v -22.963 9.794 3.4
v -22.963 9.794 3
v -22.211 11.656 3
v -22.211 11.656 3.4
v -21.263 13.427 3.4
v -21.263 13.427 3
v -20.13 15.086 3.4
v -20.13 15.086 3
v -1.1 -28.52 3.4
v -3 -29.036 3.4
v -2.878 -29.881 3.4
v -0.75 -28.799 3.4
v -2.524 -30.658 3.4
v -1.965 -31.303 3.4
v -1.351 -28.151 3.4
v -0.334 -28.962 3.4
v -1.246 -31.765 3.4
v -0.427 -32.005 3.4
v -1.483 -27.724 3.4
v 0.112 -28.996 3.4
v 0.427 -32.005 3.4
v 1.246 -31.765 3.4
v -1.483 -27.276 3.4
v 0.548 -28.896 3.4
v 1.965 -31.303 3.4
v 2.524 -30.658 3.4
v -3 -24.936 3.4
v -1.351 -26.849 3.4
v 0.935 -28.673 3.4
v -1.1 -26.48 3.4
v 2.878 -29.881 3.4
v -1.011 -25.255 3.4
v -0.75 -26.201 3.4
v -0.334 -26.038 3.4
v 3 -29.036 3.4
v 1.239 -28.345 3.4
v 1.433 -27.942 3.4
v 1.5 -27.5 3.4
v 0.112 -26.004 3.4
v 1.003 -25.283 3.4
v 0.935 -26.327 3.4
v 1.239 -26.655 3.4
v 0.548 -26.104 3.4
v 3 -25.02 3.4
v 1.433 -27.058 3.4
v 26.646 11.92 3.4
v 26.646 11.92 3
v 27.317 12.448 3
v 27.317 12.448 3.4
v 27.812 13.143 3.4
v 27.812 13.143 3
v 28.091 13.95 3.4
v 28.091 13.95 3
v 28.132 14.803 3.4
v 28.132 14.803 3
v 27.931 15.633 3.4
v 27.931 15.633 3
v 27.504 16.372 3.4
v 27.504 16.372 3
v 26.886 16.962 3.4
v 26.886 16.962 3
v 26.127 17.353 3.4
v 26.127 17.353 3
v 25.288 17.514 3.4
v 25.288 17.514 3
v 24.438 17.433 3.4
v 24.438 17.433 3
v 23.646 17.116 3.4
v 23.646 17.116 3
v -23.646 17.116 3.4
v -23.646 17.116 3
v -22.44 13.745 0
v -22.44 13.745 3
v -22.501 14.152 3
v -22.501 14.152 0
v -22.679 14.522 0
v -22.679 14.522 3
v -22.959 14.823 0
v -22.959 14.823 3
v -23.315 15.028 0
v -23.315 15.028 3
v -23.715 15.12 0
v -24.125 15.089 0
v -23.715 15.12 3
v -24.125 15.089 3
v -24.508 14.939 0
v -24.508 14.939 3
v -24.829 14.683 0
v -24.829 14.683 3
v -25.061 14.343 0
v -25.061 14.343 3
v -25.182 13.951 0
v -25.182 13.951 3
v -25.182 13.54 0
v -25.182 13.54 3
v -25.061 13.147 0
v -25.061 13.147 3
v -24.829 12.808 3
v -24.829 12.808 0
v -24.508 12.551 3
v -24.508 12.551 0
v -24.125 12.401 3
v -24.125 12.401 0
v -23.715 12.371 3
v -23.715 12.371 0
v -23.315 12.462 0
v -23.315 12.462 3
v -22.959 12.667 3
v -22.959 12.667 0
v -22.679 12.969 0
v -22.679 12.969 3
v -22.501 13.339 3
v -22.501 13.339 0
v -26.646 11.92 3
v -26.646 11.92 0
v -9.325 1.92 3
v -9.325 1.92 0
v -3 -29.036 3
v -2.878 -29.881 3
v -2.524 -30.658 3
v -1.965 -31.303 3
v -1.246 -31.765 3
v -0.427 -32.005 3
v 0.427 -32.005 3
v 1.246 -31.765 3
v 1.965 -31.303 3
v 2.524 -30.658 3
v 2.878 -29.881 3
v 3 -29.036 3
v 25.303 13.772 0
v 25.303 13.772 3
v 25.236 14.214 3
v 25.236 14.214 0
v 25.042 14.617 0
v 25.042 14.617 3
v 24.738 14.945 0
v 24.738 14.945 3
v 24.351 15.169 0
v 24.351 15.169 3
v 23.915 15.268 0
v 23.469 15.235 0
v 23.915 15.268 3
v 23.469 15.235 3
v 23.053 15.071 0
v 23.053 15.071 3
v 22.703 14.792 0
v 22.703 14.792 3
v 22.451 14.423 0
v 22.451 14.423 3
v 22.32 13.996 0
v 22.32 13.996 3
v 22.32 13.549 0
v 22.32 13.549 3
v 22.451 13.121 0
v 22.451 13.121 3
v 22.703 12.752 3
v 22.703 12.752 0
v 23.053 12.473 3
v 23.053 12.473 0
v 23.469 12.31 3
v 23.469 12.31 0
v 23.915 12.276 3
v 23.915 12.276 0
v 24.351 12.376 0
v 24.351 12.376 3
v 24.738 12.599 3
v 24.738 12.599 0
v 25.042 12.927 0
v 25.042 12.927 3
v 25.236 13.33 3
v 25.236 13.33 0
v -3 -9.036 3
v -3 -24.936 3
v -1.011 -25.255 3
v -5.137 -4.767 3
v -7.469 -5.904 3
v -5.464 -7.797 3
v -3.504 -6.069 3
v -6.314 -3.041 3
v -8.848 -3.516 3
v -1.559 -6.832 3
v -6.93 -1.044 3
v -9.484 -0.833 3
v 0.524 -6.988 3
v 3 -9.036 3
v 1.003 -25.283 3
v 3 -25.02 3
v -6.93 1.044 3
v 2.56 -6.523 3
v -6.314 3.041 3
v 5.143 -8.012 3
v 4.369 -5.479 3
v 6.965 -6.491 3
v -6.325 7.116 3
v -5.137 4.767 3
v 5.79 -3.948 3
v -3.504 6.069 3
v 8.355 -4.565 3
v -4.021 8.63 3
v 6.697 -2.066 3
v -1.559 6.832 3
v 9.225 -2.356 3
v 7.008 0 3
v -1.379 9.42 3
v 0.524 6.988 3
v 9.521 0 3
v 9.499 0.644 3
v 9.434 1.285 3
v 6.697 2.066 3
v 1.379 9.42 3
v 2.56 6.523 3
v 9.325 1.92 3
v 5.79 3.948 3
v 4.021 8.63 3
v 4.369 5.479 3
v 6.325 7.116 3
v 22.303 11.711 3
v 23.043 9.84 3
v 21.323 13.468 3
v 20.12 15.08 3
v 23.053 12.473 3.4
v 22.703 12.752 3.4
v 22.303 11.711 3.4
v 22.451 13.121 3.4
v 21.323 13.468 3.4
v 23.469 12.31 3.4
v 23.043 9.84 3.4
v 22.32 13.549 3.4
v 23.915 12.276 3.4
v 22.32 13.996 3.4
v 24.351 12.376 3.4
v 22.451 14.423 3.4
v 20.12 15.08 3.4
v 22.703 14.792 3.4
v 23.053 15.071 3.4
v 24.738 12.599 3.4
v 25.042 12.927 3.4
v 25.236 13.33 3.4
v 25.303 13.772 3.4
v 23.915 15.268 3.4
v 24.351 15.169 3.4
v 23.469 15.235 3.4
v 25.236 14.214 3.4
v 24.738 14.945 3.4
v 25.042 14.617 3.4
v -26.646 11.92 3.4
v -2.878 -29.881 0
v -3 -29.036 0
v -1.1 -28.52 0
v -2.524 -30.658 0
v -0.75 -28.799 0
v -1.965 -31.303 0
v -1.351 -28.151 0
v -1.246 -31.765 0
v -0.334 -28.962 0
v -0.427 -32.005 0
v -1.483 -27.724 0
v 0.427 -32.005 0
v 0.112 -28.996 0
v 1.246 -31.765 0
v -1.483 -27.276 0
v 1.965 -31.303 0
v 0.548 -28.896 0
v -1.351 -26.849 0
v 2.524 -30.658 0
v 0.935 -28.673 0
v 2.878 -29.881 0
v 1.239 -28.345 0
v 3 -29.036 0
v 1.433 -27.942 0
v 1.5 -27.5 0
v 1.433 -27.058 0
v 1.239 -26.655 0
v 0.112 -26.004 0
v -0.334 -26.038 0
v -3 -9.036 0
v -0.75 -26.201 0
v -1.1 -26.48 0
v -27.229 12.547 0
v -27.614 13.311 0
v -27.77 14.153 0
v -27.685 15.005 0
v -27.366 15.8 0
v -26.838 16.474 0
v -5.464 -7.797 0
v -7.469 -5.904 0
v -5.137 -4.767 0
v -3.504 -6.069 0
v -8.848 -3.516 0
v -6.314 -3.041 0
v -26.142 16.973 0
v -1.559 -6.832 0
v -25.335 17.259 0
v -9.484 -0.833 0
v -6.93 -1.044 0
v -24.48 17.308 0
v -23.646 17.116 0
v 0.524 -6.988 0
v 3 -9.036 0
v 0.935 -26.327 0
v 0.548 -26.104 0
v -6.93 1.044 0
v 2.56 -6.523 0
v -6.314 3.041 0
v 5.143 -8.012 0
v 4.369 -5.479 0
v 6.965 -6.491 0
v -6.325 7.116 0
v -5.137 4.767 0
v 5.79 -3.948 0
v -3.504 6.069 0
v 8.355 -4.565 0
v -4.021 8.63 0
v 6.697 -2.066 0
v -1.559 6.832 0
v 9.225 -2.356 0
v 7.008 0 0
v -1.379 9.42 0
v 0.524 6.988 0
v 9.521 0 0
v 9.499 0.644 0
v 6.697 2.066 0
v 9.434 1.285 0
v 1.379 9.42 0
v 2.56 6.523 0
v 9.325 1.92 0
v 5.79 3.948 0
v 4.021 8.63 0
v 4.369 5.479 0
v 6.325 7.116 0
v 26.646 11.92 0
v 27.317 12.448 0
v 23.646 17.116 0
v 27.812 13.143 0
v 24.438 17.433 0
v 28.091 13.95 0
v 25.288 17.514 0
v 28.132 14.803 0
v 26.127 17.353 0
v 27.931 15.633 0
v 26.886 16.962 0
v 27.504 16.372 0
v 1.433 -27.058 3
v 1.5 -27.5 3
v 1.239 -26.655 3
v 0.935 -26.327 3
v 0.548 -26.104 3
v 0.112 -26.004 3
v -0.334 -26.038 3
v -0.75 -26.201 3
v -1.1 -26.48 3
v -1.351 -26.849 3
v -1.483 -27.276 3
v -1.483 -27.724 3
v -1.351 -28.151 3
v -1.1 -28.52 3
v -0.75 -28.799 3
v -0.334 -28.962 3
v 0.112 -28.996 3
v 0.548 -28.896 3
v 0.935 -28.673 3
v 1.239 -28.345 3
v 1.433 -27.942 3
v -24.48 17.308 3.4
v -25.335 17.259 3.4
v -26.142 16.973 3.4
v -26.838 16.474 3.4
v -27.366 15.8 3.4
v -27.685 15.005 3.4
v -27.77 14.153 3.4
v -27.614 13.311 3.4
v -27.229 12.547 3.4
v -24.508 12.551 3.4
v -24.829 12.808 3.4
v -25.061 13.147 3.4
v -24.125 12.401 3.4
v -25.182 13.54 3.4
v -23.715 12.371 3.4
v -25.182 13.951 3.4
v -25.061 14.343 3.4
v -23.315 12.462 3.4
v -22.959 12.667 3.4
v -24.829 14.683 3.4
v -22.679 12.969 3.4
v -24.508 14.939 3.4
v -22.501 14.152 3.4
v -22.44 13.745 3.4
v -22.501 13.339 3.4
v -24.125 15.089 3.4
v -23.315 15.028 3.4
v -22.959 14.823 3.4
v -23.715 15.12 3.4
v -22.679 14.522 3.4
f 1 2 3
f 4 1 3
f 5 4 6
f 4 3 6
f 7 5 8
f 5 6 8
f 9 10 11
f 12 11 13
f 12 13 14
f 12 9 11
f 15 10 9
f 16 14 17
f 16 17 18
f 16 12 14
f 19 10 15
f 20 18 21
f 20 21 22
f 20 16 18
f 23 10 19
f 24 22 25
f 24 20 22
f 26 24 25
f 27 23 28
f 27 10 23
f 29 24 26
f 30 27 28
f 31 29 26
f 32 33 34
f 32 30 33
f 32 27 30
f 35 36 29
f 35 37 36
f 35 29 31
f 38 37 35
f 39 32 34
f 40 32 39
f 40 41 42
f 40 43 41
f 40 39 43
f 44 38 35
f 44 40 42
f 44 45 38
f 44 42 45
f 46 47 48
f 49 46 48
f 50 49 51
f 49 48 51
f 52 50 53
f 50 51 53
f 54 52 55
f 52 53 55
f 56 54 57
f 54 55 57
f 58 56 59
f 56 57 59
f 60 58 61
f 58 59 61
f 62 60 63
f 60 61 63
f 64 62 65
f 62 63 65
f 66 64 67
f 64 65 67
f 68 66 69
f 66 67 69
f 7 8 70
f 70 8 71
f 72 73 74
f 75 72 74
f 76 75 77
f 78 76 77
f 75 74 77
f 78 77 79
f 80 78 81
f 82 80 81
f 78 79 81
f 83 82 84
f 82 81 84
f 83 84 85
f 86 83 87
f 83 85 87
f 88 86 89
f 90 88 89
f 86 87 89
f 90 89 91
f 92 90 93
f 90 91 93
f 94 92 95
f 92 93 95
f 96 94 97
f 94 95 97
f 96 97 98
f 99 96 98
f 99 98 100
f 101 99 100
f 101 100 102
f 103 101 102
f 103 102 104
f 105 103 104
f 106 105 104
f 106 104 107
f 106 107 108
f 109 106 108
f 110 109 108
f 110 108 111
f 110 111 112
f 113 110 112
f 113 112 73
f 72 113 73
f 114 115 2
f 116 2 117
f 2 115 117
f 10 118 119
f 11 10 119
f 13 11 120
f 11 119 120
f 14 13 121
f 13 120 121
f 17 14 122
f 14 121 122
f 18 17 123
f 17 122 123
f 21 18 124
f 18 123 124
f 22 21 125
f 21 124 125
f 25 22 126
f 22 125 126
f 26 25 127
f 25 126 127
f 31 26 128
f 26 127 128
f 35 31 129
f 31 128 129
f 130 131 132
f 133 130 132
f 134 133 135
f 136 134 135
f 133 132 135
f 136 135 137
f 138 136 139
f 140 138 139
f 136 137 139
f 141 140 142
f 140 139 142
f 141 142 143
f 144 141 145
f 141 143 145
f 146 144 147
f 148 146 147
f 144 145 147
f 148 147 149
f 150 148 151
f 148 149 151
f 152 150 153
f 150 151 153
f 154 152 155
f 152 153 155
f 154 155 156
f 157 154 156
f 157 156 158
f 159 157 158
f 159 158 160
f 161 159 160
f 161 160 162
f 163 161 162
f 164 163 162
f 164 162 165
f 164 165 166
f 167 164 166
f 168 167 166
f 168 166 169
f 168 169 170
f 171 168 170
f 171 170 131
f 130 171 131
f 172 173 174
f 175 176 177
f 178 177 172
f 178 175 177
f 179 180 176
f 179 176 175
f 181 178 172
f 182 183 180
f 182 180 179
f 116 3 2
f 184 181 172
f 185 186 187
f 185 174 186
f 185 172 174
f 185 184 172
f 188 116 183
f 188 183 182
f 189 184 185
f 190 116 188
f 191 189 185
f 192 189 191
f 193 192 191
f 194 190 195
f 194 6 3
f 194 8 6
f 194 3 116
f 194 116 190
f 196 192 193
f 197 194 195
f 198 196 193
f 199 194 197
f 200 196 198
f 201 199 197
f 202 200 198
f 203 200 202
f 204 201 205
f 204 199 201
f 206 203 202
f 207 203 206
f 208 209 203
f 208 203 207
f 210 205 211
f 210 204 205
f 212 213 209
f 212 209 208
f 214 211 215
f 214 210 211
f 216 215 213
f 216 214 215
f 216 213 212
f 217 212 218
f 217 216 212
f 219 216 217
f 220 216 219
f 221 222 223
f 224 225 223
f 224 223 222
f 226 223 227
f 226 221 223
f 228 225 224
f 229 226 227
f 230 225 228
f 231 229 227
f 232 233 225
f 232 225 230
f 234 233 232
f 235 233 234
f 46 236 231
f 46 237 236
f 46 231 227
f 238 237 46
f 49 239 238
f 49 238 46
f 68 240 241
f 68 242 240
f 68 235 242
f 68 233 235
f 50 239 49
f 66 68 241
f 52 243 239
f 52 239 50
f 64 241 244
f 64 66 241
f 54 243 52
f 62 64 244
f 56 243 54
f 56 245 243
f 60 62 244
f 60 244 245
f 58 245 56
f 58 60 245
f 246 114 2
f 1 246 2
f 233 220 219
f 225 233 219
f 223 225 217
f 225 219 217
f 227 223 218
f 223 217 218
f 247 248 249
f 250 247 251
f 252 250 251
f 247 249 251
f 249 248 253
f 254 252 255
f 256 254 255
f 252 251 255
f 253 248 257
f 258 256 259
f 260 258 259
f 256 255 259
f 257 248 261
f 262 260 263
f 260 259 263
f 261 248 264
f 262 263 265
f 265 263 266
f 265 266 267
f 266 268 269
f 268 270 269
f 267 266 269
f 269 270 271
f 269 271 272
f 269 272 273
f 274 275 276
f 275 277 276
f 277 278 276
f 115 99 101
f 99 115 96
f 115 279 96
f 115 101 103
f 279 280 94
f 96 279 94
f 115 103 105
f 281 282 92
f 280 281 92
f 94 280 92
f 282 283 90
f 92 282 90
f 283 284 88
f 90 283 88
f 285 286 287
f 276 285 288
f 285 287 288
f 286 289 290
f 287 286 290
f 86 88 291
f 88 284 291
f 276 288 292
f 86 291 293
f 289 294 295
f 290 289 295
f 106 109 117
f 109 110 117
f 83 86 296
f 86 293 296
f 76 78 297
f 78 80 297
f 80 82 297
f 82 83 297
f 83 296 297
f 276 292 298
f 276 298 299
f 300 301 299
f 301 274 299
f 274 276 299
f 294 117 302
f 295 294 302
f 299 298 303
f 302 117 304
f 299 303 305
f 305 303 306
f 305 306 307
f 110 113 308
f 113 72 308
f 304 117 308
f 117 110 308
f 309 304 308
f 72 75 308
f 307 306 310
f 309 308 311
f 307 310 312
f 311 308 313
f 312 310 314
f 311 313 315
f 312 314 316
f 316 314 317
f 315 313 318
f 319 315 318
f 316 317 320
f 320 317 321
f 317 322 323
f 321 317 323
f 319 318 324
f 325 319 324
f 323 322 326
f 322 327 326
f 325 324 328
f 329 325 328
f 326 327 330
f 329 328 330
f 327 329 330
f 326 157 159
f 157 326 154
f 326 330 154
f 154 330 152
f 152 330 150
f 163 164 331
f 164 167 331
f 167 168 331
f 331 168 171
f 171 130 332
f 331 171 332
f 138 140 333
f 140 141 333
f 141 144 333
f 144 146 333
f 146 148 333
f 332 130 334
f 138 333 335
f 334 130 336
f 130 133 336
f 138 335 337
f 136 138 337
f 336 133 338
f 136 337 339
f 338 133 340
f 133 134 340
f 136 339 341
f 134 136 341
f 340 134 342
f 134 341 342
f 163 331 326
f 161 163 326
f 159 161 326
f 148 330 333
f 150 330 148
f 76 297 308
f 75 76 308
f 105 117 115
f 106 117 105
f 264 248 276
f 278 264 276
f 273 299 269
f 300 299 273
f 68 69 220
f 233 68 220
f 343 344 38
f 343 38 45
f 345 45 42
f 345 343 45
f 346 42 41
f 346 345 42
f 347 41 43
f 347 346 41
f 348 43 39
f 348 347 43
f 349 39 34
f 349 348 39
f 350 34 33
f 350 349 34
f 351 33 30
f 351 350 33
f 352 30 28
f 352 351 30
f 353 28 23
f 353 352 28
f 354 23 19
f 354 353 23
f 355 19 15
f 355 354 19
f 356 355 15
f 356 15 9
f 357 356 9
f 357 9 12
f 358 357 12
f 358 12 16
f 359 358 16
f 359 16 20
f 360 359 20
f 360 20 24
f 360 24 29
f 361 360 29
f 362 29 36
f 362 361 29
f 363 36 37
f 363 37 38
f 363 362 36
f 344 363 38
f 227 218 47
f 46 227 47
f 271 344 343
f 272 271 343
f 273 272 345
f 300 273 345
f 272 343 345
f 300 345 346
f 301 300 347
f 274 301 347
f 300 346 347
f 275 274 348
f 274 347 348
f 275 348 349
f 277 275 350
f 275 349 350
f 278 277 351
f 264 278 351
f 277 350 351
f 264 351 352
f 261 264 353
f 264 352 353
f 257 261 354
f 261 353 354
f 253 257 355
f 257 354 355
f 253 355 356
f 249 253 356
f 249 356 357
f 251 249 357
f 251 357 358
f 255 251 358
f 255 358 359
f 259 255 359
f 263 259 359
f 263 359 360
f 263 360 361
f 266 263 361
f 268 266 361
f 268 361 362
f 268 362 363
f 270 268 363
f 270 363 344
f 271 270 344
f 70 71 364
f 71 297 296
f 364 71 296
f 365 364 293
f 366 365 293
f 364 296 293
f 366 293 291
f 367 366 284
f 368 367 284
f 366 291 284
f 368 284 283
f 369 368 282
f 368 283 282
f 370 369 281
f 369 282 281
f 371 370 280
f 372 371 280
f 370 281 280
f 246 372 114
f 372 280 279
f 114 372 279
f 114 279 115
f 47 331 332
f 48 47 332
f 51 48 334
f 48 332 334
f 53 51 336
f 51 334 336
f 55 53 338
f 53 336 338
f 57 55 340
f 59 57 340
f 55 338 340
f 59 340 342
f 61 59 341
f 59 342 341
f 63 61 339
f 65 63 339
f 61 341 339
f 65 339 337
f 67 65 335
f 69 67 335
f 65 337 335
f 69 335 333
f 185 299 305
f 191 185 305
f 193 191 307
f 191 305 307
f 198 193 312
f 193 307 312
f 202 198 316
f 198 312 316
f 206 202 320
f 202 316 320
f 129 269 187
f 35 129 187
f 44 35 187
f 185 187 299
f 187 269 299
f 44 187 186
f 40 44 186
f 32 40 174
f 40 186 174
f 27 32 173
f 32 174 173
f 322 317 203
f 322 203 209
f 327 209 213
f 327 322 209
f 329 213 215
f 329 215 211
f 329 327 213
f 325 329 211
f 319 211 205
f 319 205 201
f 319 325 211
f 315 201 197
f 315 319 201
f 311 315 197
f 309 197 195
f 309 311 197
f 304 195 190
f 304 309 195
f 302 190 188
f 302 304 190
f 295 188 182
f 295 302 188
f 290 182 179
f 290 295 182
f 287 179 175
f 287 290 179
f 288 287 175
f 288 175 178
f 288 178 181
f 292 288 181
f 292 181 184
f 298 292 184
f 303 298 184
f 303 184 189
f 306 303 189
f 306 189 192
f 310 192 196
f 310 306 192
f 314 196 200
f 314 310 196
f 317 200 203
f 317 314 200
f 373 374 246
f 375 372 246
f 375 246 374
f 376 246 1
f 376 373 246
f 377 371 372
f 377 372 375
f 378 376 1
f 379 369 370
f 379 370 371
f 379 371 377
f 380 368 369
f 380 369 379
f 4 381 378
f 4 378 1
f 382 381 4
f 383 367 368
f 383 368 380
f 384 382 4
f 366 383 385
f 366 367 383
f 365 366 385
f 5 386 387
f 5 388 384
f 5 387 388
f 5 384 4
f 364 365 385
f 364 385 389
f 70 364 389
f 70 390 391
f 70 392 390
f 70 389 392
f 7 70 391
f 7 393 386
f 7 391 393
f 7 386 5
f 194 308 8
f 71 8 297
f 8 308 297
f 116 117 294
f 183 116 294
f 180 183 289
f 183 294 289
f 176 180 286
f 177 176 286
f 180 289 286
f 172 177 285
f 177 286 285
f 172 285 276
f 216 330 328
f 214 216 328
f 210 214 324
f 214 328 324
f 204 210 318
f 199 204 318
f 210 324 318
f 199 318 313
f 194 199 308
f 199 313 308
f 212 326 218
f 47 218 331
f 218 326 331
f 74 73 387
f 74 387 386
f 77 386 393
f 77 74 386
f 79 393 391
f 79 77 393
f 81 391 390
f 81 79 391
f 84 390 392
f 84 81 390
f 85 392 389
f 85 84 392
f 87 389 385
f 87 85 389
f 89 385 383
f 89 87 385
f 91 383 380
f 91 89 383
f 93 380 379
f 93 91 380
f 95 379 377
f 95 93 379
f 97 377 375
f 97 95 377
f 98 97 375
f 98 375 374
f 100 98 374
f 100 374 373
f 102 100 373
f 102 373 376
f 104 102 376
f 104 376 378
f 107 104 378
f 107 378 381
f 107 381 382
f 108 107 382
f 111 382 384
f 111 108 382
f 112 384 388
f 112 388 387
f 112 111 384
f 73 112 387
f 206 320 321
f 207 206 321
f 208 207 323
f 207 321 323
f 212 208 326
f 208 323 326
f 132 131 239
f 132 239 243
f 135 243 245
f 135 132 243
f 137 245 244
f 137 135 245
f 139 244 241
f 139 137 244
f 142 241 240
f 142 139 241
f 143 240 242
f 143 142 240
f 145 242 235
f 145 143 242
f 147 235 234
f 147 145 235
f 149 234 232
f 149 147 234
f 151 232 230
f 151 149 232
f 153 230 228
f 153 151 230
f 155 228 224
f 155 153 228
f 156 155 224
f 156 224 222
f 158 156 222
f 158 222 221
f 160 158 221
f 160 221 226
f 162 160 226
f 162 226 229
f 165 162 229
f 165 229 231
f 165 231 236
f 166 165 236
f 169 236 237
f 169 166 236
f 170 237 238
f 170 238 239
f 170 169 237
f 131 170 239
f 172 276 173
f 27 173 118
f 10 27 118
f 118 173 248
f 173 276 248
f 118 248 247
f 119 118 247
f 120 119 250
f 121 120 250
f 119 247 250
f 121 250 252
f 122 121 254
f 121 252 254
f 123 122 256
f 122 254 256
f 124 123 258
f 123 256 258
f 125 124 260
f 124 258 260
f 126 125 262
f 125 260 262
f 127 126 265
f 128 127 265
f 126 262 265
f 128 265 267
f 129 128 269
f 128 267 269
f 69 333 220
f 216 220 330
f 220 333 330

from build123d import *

# Parameters (mm, degrees)
F1_R     = 7.0078592828
F2_DEPTH = 3
F3_R     = 1.3785641614
F3_R_2   = 1.5
F4_DEPTH = 25
F5_R     = 1.3785641614
F5_R_2   = 1.5
F6_DEPTH = 0.4


# Not quite as in the source:
# - a feature names something its author has since deleted; it is built from what else it names


with BuildPart() as f2:
    # F1 (on Top) → F2 (new body)
    with BuildSketch(Plane.XY):
        with BuildLine():
            ThreePointArc((6.3250837122, 7.115890399), (8.2451158332, 4.7603198458), (9.3250837122, 1.9197379763))
            Line((9.3250837122, 1.9197379763), (26.6455917878, 11.9197379763))
            ThreePointArc((26.6455917878, 11.9197379763), (27.7436679992, 16.0178141876), (23.6455917878, 17.115890399))
            Line((23.6455917878, 17.115890399), (6.3250837122, 7.115890399))
        make_face()
        with BuildLine():
            Line((3, -29.0356283753), (3, -9.0356283753))
            ThreePointArc((3, -9.0356283753), (0, -9.5206396916), (-3, -9.0356283753))
            Line((-3, -9.0356283753), (-3, -29.0356283753))
            ThreePointArc((-3, -29.0356283753), (0, -32.0356283753), (3, -29.0356283753))
        make_face()
        with BuildLine():
            ThreePointArc((3, -9.0356283753), (7.7202493228, -5.5713849742), (9.5206396916, 0))
            ThreePointArc((9.5206396916, 0), (9.4716245242, 0.9648362606), (9.3250837122, 1.9197379763))
            ThreePointArc((9.3250837122, 1.9197379763), (8.2451158332, 4.7603198458), (6.3250837122, 7.115890399))
            ThreePointArc((6.3250837122, 7.115890399), (0, 9.5206396916), (-6.3250837122, 7.115890399))
            ThreePointArc((-6.3250837122, 7.115890399), (-8.2451158332, 4.7603198458), (-9.3250837122, 1.9197379763))
            ThreePointArc((-9.3250837122, 1.9197379763), (-8.2451158332, -4.7603198458), (-3, -9.0356283753))
            ThreePointArc((-3, -9.0356283753), (0, -9.5206396916), (3, -9.0356283753))
        make_face()
        Circle(F1_R, mode=Mode.SUBTRACT)
        with BuildLine():
            ThreePointArc((-9.3250837122, 1.9197379763), (-8.2451158332, 4.7603198458), (-6.3250837122, 7.115890399))
            Line((-6.3250837122, 7.115890399), (-23.6455917878, 17.115890399))
            ThreePointArc((-23.6455917878, 17.115890399), (-27.3659550895, 15.7997415376), (-26.6455917878, 11.9197379763))
            Line((-26.6455917878, 11.9197379763), (-9.3250837122, 1.9197379763))
        make_face()
    extrude(amount=F2_DEPTH)

    # F3 (on face) → F4 (cut)
    with BuildSketch(Plane.XY.offset(3)):
        with Locations((-23.8184579752, 13.7452195212)):
            Circle(F3_R)
        with Locations((23.8028700918, 13.7721957361)):
            Circle(F3_R_2)
        with Locations((0, -27.5)):
            Circle(F3_R_2)
    extrude(amount=-F4_DEPTH, mode=Mode.SUBTRACT)

    # F5 (on face) → F6 (join)
    with BuildSketch(Plane.XY.offset(3)):
        with BuildLine():
            ThreePointArc((-22.963211557, 9.7937147588), (-21.7607776153, 12.554595023), (-20.1298891441, 15.0860985312))
            Line((-20.1298891441, 15.0860985312), (-23.6455917878, 17.115890399))
            ThreePointArc((-23.6455917878, 17.115890399), (-27.3659550895, 15.7997415376), (-26.6455917878, 11.9197379763))
            Line((-26.6455917878, 11.9197379763), (-22.963211557, 9.7937147588))
        make_face()
        with Locations((-23.8184579752, 13.7452195212)):
            Circle(F5_R, mode=Mode.SUBTRACT)
        with BuildLine():
            Line((23.6455917878, 17.115890399), (20.1200227065, 15.0804021408))
            ThreePointArc((20.1200227065, 15.0804021408), (21.8423336439, 12.6055758249), (23.0431293377, 9.839855311))
            Line((23.0431293377, 9.839855311), (26.6455917878, 11.9197379763))
            ThreePointArc((26.6455917878, 11.9197379763), (27.7436679992, 16.0178141876), (23.6455917878, 17.115890399))
        make_face()
        with Locations((23.8028700918, 13.7721957361)):
            Circle(F5_R_2, mode=Mode.SUBTRACT)
        with BuildLine():
            ThreePointArc((3, -25.020474568), (-0.0045904533, -25.3057184102), (-3, -24.9363277107))
            Line((-3, -24.9363277107), (-3, -29.0356283753))
            ThreePointArc((-3, -29.0356283753), (0, -32.0356283753), (3, -29.0356283753))
            Line((3, -29.0356283753), (3, -25.020474568))
        make_face()
        with Locations((0, -27.5)):
            Circle(F5_R_2, mode=Mode.SUBTRACT)
    extrude(amount=F6_DEPTH)


solid = f2.part
